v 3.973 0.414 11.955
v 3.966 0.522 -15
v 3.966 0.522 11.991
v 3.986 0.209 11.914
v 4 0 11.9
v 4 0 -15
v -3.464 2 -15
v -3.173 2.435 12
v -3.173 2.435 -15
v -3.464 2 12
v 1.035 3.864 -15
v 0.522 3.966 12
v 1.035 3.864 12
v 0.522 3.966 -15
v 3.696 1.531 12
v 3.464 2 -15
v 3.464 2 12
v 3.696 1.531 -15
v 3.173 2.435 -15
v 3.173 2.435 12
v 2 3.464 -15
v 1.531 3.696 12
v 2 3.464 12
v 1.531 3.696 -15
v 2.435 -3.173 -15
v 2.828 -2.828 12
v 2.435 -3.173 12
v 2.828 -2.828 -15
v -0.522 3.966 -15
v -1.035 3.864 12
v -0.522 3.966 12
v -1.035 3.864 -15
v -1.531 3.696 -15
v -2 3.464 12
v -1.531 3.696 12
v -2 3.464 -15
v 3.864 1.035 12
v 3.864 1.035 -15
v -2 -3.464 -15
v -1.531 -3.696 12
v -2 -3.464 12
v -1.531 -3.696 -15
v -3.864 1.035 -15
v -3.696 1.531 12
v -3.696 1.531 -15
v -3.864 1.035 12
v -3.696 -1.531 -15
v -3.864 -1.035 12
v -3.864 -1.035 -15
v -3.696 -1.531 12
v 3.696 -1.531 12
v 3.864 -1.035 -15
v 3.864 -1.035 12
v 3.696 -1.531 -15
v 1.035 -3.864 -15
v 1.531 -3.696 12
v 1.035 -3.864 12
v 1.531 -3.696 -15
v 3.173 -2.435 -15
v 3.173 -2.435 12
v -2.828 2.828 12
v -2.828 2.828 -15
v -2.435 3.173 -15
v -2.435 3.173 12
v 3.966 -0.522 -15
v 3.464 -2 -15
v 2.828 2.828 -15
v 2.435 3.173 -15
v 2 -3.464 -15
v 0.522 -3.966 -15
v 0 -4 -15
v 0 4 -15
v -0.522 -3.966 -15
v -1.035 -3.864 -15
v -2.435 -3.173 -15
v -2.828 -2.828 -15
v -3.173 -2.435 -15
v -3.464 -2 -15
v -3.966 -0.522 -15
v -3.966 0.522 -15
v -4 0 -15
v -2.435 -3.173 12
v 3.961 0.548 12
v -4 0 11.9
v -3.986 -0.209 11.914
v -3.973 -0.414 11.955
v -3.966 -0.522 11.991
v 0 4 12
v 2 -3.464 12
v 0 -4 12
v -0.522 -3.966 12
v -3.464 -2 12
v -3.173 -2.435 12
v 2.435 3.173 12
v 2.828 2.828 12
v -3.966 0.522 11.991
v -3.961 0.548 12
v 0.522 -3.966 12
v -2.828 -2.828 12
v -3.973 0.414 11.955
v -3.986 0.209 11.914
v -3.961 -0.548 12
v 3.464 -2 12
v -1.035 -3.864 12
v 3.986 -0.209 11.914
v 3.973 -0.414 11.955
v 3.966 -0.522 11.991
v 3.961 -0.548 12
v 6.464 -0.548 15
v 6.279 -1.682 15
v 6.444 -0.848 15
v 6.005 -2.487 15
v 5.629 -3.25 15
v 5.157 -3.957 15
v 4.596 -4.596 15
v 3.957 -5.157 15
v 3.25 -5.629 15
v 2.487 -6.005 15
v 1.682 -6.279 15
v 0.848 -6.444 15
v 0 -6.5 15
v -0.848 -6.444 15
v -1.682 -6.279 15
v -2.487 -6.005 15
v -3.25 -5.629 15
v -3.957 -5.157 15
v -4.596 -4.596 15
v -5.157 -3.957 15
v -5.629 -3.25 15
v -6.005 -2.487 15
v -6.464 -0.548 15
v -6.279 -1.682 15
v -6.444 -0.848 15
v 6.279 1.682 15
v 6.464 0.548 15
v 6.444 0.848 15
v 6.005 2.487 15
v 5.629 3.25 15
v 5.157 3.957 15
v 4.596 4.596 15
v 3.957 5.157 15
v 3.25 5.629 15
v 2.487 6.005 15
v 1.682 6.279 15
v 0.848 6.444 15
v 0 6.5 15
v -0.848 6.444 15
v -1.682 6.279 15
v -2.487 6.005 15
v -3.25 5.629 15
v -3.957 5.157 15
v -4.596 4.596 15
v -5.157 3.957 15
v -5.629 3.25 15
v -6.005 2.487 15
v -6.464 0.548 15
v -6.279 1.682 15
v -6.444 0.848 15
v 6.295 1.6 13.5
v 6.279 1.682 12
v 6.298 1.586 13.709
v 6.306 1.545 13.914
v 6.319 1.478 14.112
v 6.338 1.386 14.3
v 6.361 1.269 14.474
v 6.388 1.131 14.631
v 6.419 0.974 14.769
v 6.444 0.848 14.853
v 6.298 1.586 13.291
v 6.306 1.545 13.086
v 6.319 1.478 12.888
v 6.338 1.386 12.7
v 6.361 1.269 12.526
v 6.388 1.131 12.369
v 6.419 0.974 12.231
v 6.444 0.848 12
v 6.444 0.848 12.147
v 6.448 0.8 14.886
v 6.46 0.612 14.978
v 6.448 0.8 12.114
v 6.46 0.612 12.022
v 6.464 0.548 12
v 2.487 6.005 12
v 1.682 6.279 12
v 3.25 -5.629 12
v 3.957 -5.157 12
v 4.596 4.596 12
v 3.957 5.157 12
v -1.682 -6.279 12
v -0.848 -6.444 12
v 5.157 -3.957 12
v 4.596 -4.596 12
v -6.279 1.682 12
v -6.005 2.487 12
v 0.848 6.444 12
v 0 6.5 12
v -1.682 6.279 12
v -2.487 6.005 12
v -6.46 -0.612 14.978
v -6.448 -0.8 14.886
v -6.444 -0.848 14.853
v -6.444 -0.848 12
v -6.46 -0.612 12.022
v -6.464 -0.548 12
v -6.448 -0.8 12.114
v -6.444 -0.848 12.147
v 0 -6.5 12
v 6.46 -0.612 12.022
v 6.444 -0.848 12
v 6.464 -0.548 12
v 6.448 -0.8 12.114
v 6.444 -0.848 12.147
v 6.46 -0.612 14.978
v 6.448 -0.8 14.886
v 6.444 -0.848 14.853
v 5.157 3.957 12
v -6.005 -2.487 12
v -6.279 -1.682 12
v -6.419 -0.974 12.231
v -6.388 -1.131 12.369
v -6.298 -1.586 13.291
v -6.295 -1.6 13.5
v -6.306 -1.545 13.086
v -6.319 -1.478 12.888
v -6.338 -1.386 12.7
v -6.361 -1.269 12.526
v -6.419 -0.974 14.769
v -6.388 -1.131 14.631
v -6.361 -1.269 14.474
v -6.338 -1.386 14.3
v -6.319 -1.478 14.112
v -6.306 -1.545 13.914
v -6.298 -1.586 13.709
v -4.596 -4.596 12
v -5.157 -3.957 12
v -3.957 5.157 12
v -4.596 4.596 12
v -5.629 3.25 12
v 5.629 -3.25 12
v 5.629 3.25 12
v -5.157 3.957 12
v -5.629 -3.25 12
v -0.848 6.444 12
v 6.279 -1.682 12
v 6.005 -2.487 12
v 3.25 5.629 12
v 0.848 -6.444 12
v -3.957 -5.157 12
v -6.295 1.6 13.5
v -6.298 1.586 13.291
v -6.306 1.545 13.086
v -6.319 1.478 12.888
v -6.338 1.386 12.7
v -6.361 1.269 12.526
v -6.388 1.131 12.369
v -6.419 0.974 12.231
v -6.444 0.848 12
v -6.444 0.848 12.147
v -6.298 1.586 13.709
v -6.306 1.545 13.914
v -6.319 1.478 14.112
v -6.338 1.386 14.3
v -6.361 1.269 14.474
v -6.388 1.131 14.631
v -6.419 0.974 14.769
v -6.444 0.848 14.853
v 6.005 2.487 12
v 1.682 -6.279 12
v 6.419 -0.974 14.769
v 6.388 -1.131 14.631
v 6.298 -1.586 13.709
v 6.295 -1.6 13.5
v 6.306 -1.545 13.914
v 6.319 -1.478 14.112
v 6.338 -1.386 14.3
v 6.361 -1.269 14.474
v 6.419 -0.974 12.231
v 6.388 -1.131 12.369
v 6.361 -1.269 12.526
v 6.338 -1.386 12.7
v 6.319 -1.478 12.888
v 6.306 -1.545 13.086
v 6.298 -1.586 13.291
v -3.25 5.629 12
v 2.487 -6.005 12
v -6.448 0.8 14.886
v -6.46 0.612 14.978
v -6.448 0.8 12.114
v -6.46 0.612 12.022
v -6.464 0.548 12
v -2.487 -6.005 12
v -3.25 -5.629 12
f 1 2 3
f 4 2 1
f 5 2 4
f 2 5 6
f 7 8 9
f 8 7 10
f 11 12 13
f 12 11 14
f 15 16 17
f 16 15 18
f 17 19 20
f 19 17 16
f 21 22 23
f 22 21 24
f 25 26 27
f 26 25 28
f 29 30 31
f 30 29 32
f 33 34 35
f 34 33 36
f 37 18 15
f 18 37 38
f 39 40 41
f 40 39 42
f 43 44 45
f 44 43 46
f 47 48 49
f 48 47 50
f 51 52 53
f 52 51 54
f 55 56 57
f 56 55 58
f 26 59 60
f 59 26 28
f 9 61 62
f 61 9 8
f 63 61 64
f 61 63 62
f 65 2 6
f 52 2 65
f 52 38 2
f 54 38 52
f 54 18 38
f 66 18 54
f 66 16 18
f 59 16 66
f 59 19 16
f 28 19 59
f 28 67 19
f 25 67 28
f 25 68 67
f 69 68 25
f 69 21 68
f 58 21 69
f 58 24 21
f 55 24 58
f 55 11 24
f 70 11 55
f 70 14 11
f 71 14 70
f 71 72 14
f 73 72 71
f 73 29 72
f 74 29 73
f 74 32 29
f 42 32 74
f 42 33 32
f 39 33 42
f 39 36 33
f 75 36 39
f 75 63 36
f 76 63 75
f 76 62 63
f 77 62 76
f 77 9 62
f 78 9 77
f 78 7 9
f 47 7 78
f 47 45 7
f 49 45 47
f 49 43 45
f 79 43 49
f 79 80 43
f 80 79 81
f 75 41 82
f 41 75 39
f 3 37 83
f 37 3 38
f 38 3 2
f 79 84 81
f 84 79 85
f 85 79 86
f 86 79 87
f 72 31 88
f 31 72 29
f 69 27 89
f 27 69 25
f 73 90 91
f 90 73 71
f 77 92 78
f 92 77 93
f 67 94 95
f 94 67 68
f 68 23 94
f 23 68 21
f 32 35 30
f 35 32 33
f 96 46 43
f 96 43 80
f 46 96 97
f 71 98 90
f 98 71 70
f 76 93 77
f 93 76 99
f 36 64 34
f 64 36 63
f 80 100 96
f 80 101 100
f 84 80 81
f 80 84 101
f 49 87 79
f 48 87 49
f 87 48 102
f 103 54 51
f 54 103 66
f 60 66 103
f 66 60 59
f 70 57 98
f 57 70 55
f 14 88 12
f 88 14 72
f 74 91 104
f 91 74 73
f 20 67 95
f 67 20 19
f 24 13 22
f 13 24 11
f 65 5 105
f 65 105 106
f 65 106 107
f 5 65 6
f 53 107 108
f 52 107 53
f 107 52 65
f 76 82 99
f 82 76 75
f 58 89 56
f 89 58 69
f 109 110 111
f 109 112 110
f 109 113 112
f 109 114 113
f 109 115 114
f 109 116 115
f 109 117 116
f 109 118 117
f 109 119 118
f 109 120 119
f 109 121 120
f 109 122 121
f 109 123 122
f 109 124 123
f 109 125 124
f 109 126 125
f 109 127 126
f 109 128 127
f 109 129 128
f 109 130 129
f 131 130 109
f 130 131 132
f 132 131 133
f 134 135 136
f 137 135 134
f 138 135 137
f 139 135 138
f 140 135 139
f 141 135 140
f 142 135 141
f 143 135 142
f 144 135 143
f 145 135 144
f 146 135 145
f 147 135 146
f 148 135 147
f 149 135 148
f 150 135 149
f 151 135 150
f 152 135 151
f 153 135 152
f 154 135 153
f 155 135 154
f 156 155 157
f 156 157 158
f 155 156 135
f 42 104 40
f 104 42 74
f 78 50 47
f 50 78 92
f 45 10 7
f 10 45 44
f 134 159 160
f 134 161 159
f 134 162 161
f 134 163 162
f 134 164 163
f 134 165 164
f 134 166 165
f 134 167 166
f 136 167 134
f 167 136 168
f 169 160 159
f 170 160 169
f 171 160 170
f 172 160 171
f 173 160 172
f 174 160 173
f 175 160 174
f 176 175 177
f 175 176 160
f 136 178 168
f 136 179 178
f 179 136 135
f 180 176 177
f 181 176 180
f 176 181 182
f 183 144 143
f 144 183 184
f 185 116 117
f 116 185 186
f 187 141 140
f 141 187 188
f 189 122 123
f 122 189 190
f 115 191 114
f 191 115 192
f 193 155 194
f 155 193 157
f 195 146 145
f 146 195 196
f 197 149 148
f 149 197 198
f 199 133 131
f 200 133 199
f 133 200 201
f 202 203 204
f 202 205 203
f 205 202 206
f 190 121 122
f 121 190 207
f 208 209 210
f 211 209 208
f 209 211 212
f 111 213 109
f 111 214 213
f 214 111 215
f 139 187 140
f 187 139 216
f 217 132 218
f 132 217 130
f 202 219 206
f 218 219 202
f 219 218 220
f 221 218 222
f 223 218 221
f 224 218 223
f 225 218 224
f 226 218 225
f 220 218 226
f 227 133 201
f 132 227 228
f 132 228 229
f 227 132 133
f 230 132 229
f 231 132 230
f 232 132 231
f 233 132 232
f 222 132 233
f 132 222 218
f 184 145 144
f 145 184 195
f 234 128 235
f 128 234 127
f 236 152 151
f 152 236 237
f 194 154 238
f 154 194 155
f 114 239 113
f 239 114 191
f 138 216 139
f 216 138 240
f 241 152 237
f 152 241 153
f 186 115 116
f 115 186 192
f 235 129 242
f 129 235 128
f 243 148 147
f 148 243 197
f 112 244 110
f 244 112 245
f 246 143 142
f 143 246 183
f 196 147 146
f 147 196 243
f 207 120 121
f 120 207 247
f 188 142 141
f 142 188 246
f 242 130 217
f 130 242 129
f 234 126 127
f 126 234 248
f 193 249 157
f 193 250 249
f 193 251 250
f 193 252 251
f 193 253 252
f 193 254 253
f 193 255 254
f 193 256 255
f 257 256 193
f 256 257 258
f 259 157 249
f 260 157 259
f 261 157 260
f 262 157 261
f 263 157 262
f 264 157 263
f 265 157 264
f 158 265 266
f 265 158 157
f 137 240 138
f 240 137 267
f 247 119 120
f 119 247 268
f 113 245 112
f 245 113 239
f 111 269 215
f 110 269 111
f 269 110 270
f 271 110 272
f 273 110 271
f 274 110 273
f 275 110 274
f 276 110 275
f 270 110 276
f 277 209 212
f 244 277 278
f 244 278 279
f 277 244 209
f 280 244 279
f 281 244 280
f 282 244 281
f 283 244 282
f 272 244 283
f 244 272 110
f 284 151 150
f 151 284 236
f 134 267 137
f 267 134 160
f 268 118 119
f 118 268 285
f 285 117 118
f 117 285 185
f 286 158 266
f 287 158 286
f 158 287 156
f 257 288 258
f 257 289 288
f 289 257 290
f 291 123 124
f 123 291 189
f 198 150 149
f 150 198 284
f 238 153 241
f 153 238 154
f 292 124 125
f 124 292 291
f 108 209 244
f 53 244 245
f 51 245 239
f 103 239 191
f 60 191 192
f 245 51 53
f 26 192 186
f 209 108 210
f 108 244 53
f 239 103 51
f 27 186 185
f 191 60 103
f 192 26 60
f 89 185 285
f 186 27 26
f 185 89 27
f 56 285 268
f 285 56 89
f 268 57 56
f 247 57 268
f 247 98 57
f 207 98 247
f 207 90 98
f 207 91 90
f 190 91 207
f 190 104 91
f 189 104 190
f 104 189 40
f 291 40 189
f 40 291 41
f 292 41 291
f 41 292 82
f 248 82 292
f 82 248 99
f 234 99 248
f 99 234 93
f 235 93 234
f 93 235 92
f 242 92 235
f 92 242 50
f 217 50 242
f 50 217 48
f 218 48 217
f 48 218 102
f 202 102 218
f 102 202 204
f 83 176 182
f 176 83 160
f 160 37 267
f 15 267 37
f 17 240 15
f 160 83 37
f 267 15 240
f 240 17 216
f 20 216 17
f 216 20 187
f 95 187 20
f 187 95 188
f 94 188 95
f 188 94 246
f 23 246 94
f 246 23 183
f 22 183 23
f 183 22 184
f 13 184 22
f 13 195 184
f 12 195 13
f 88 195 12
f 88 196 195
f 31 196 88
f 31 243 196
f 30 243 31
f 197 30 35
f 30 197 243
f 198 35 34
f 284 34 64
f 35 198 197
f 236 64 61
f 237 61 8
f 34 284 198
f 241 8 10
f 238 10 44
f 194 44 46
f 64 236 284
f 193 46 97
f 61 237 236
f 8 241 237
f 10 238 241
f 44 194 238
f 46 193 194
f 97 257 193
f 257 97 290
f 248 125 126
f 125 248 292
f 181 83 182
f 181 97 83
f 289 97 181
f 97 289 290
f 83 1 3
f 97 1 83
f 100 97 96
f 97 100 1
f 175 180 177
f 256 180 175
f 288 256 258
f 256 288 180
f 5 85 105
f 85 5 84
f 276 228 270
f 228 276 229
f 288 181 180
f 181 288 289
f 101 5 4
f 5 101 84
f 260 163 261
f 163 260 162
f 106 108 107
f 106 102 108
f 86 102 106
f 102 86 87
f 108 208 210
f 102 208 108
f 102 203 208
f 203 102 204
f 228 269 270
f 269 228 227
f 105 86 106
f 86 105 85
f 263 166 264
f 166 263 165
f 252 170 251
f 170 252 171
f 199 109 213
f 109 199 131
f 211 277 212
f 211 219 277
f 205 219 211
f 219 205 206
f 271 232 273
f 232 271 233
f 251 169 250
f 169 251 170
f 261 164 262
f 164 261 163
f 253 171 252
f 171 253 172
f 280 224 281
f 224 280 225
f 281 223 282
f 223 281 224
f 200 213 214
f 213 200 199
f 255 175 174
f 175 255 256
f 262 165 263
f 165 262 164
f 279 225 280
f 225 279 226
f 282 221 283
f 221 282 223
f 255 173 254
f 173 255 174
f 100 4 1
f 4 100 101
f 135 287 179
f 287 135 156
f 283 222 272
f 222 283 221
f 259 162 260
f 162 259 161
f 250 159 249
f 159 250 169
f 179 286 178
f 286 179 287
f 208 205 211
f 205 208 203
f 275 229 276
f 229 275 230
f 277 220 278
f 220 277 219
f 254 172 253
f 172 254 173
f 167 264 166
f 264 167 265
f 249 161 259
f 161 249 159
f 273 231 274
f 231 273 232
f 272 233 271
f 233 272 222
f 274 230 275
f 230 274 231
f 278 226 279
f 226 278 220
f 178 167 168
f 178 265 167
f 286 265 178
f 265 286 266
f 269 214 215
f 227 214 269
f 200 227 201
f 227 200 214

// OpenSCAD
// file: cad_config.scad
// Shared dimensions for the reference toolhead, in millimetres.
//
// These constants are mirrored by `constants:` in cad/manifest.yaml and
// by the collision primitives in steropes/gantry.py — the drift guard in
// tests/test_cadimport.py fails if any of the three diverge.

CARRIAGE_W = 40;                    // X width  (2 * gantry.CARRIAGE_HALF_MM[0])
CARRIAGE_D = 40;                    // Y depth  (2 * gantry.CARRIAGE_HALF_MM[1])
CARRIAGE_H = 20;                    // Z height (2 * gantry.CARRIAGE_HALF_MM[2])

FINGER_DIA = 8;                     // plunger shaft Ø (2 * gantry.FINGER_RADIUS_MM)
FINGER_LEN = 30;                    // shaft length (2 * gantry.FINGER_HALF_LEN_MM)
FINGER_OFFSET = [12, 0, -25];       // toolhead frame (gantry.FINGER_OFFSET_MM)
TOOLCAM_OFFSET = [-12, 0, -11];     // toolhead frame (gantry.TOOLCAM_OFFSET_MM)

M3_CLEAR = 3.2;                     // M3 clearance hole

SERVO_W = 23;                       // 9 g servo body, for the carriage pocket
SERVO_D = 12.5;
SERVO_H = 8;

$fn = 48;
// main file
// Finger body: the pogo-pin style plunger that taps the DUT screen.
// Authored in the finger body frame — origin at the shaft centre
// (matching the collision cylinder in gantry.toolhead_xml), Z up,
// tip toward -Z.
//
// Export: openscad -o finger_body.stl -D 'PART="finger_body"' finger_body.scad
include <cad_config.scad>

PART = "preview";

module finger_body() {
    difference() {
        union() {
            // shaft — this is exactly the collision envelope, keep it
            // FINGER_DIA x FINGER_LEN centred on the origin
            cylinder(d = FINGER_DIA, h = FINGER_LEN, center = true);
            // spring collar at the top end (visual only; above the
            // collision envelope, it never meets the DUT)
            translate([0, 0, FINGER_LEN / 2 - 1.5])
                cylinder(d = 13, h = 3, center = true);
        }
        // retaining-pin cross hole through the collar
        translate([0, 0, FINGER_LEN / 2 - 1.5])
            rotate([0, 90, 0])
                cylinder(d = M3_CLEAR, h = 14, center = true);
    }
}

if (PART == "preview" || PART == "finger_body")
    finger_body();
